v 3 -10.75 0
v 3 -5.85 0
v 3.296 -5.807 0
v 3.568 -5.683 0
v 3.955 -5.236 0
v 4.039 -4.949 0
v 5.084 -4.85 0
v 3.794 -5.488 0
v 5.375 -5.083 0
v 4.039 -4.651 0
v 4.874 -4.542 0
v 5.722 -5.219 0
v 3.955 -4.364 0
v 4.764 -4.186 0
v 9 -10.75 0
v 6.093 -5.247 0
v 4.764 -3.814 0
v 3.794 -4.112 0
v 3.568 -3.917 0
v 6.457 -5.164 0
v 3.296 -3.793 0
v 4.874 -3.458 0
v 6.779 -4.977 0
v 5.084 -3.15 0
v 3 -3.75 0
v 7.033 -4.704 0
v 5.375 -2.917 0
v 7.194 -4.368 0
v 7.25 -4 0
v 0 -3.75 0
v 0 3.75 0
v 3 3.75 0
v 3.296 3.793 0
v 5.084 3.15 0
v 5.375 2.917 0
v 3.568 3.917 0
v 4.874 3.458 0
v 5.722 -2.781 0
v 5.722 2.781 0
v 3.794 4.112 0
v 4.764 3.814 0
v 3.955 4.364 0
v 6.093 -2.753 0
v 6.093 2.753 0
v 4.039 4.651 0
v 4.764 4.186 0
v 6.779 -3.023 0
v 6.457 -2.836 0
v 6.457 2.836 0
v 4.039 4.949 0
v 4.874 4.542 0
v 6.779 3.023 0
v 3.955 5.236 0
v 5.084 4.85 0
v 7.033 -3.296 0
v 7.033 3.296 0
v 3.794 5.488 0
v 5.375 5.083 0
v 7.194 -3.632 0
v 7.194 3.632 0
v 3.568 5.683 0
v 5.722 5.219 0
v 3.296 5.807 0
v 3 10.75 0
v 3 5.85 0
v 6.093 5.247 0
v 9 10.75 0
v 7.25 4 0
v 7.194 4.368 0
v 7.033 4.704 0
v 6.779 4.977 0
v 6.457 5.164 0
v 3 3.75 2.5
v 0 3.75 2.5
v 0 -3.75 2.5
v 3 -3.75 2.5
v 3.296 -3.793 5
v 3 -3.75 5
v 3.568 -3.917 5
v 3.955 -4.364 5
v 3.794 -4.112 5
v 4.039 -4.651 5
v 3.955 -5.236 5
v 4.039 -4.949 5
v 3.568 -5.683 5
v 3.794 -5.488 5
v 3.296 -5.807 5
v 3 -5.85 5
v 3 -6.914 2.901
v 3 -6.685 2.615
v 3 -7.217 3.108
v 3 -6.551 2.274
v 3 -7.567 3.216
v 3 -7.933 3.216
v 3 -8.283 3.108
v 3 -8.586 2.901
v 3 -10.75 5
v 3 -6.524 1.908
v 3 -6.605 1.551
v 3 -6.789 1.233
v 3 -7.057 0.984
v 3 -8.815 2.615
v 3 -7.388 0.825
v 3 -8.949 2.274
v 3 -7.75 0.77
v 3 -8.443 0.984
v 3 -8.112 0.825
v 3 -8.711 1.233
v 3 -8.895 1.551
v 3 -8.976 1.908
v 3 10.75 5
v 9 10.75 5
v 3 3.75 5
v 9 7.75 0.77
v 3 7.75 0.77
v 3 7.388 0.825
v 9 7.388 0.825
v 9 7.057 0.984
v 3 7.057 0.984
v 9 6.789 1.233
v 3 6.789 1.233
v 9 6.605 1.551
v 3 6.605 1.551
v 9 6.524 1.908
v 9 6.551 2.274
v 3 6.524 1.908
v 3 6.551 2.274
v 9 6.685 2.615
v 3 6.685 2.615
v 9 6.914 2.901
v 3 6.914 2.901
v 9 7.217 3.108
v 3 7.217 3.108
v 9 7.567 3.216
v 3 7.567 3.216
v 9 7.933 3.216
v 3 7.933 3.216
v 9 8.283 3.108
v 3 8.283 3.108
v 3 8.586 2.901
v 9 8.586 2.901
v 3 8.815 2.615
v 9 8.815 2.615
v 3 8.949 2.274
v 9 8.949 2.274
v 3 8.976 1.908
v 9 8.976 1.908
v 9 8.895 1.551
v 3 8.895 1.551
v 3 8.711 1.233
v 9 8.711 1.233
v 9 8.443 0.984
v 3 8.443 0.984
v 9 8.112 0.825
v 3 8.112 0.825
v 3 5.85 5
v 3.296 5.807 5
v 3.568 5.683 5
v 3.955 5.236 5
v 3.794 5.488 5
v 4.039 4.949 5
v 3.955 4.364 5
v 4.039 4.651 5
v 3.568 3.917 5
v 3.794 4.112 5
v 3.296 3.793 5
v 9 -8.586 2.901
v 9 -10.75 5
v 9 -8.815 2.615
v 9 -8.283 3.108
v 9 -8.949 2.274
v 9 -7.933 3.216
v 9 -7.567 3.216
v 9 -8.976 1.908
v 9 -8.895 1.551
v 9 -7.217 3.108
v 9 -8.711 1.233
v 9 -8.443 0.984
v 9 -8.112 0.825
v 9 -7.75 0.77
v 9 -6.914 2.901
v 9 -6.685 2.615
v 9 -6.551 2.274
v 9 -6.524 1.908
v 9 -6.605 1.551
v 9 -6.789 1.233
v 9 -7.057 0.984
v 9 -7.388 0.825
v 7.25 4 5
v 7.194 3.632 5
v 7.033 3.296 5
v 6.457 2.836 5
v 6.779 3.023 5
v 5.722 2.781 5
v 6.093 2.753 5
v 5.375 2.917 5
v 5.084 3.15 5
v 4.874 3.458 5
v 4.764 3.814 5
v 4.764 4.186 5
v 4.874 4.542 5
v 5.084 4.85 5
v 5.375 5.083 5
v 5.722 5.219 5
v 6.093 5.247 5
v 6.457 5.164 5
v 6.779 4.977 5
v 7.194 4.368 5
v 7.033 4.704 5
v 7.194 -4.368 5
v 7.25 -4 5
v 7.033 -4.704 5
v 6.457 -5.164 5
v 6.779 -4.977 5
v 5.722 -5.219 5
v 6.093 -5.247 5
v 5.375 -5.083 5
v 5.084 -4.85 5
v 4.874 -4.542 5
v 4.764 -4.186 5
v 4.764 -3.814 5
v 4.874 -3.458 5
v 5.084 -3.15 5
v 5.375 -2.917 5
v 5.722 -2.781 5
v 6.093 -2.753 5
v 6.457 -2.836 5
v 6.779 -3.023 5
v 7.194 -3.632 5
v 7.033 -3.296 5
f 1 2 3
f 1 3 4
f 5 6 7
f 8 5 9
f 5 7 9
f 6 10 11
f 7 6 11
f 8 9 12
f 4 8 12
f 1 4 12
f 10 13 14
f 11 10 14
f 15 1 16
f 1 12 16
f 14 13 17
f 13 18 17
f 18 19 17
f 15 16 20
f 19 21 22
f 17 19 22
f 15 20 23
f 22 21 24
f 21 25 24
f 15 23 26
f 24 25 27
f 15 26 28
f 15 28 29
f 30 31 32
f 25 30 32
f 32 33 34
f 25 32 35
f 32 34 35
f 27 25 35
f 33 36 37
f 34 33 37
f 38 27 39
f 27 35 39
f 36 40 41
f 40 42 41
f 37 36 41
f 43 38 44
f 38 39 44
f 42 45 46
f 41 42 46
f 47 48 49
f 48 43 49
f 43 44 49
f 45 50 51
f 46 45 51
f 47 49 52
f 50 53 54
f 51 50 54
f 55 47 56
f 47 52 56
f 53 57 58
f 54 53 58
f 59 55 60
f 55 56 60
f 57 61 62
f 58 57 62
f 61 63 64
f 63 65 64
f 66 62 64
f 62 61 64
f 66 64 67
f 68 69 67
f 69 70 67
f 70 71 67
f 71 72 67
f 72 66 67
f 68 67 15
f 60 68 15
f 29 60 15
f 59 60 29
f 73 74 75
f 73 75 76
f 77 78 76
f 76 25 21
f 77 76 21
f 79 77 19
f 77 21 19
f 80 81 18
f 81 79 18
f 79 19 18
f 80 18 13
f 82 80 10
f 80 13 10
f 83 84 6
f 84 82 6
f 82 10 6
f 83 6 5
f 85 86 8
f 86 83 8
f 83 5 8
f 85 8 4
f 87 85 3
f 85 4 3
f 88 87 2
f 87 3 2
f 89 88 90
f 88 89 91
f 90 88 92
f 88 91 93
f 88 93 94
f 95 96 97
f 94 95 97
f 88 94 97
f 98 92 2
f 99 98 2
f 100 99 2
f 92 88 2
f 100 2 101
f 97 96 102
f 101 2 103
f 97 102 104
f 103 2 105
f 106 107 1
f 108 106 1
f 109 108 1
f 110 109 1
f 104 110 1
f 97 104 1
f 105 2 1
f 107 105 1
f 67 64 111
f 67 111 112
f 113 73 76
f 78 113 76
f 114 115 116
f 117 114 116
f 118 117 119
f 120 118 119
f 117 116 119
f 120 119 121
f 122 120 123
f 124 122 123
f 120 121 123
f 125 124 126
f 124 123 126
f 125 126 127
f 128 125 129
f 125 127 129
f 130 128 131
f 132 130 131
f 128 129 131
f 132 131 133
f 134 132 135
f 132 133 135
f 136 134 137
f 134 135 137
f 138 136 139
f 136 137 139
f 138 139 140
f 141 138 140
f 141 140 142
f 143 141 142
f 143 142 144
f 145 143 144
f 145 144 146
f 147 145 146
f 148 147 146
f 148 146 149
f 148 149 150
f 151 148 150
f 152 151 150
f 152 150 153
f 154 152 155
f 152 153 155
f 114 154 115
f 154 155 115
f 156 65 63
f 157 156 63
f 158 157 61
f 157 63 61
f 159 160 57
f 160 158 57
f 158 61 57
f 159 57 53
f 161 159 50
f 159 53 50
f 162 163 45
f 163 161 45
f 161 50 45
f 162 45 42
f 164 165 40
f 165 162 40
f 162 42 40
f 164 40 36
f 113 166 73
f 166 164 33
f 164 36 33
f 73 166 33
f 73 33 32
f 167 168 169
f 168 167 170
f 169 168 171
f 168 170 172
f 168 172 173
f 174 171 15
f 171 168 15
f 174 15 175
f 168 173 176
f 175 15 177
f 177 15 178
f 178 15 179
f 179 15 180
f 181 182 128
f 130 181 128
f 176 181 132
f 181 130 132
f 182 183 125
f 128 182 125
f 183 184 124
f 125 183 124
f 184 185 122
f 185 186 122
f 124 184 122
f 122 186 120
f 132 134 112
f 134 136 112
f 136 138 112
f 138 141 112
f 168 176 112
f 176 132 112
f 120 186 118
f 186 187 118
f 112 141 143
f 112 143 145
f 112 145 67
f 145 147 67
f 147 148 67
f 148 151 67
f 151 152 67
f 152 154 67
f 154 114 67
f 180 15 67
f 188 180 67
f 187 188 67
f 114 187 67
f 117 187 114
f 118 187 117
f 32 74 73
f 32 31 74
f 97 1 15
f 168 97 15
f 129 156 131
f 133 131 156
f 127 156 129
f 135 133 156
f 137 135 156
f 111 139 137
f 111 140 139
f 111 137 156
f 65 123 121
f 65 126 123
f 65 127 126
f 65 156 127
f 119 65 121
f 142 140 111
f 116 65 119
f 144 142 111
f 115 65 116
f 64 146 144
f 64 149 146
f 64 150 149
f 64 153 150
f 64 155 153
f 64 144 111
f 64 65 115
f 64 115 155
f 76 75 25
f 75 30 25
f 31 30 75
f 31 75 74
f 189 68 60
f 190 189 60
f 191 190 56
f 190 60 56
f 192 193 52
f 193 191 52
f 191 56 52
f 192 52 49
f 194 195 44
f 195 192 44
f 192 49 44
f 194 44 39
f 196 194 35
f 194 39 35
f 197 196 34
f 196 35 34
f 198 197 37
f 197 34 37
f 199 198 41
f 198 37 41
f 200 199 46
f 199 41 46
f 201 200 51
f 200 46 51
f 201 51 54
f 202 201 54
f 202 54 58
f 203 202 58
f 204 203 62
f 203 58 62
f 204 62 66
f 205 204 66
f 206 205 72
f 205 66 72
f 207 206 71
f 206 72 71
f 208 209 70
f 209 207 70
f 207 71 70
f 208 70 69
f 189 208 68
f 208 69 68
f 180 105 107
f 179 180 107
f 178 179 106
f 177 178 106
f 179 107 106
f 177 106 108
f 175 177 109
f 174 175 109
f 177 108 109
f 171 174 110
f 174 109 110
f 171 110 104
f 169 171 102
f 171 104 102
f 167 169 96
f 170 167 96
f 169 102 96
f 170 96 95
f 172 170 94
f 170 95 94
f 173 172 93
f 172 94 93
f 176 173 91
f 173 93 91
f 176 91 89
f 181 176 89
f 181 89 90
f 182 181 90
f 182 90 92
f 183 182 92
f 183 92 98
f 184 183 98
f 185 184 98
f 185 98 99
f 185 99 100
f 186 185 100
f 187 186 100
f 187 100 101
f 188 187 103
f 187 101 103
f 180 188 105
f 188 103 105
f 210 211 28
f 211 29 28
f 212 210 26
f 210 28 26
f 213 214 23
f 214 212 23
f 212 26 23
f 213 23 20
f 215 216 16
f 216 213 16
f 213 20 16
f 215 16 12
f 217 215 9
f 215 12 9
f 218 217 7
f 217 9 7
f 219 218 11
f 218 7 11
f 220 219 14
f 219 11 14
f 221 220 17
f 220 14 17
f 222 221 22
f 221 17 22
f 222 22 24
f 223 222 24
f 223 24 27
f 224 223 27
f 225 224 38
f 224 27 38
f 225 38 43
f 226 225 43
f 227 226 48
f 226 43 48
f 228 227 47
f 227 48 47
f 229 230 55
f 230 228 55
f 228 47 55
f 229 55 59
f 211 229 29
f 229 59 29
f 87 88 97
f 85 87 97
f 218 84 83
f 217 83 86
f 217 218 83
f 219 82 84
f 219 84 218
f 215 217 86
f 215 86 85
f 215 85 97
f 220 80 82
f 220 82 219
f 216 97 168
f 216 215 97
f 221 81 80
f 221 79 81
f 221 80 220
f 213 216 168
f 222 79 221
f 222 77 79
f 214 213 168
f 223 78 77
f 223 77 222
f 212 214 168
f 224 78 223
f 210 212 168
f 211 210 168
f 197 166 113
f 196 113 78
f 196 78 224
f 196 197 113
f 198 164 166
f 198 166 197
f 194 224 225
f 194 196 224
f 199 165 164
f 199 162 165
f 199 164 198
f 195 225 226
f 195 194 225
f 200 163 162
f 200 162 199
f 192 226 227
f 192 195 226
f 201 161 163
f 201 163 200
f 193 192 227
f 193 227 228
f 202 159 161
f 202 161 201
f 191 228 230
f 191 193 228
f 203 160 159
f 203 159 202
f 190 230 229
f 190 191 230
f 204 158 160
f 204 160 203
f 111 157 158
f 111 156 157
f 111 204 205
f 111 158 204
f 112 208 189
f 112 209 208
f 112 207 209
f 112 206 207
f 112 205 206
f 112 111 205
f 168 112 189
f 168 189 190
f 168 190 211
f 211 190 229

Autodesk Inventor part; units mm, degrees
ref_plane "YZ Plane" through (0, 0, 0) normal (1, 0, 0) x (0, 1, 0)
ref_plane "XZ Plane" through (0, 0, 0) normal (0, 1, 0) x (-1, 0, 0)
ref_plane "XY Plane" through (0, 0, 0) normal (0, 0, 1) x (1, 0, 0)
sketch "スケッチ1" plane through (0, 0, 0) normal (0, 0, 1) x (1, 0, 0)
  line L0 (0, -3.75) -> (0, 3.75)
  line L1 (0, -3.75) -> (3, -3.75)
  line L2 (3, -5.85) -> (3, -10.75)
  line L3 (3, -10.75) -> (9, -10.75)
  line L4 (9, -10.75) -> (9, 10.75)
  line L5 (0, 0) -> (9, 0) construction
  arc A0 (3, -5.85) -> (3, -3.75) centre (3, -4.8) ccw
  line L6 (3, -7.75) -> (9, -7.75) construction
  line L7 (3, -9.25) -> (9, -9.25) construction
  line L8 (3, -6.25) -> (9, -6.25) construction
  line L9 (0, 3.75) -> (3, 3.75)
  line L10 (3, 5.85) -> (3, 10.75)
  line L11 (3, 10.75) -> (9, 10.75)
  arc A1 (3, 3.75) -> (3, 5.85) centre (3, 4.8) ccw
  line L12 (3, 7.75) -> (9, 7.75) construction
  line L13 (3, 9.25) -> (9, 9.25) construction
  line L14 (3, 6.25) -> (9, 6.25) construction
  circle A2 centre (6, -4) radius 1.25
  circle A3 centre (6, 4) radius 1.25
  line L15 (6, -10.75) -> (6, 10.75) construction
  line L16 (3, 3.75) -> (3, -3.75)
  dimension "d0" = 3
  dimension "d1" = 6
  dimension "d2" = 1.05
  dimension "d3" = 7.5
  dimension "d4" = 21.5
  dimension "d5" = 3
  dimension "d6" = 15.5
  dimension "d7" = 2.5
  dimension "d9" = 8
extrude "押し出し1" add sketch "スケッチ1" along normal blind 5 contours L16 A1 L10 L11 L4 L3 L2 A0
extrude "押し出し2" add sketch "スケッチ1" along normal blind 2.5 contours L0 L9 L16 L1
sketch "スケッチ2" plane through (9, -10.75, 0) normal (1, 0, 0) x (0, 0, -1)
  line L0 (0, 10.75) -> (-5, 10.75) construction
  line L1 (-5, 0) -> (-5, 21.5) projected
  line L2 (0, 0) -> (-5, 0) projected
  line L3 (0, 21.5) -> (-5, 21.5) projected
  line L4 (-2, 0) -> (-2, 21.5) construction
  point P0 (-2, 3)
  point P1 (-2, 18.5)
  dimension "d13" = 15.5
  dimension "d23" = 3
hole "穴1" at (9, -7.75, 2) at (9, 7.75, 2) direction (-1, 0, 0) diameter 2.459 depth 6 thread size "M3x0.5" class "6H" standard "ISO Metric profile"
equation "\"d13\" = d6"
properties part number "Foot_root_block" material "アルミニウム 2014-T4"
